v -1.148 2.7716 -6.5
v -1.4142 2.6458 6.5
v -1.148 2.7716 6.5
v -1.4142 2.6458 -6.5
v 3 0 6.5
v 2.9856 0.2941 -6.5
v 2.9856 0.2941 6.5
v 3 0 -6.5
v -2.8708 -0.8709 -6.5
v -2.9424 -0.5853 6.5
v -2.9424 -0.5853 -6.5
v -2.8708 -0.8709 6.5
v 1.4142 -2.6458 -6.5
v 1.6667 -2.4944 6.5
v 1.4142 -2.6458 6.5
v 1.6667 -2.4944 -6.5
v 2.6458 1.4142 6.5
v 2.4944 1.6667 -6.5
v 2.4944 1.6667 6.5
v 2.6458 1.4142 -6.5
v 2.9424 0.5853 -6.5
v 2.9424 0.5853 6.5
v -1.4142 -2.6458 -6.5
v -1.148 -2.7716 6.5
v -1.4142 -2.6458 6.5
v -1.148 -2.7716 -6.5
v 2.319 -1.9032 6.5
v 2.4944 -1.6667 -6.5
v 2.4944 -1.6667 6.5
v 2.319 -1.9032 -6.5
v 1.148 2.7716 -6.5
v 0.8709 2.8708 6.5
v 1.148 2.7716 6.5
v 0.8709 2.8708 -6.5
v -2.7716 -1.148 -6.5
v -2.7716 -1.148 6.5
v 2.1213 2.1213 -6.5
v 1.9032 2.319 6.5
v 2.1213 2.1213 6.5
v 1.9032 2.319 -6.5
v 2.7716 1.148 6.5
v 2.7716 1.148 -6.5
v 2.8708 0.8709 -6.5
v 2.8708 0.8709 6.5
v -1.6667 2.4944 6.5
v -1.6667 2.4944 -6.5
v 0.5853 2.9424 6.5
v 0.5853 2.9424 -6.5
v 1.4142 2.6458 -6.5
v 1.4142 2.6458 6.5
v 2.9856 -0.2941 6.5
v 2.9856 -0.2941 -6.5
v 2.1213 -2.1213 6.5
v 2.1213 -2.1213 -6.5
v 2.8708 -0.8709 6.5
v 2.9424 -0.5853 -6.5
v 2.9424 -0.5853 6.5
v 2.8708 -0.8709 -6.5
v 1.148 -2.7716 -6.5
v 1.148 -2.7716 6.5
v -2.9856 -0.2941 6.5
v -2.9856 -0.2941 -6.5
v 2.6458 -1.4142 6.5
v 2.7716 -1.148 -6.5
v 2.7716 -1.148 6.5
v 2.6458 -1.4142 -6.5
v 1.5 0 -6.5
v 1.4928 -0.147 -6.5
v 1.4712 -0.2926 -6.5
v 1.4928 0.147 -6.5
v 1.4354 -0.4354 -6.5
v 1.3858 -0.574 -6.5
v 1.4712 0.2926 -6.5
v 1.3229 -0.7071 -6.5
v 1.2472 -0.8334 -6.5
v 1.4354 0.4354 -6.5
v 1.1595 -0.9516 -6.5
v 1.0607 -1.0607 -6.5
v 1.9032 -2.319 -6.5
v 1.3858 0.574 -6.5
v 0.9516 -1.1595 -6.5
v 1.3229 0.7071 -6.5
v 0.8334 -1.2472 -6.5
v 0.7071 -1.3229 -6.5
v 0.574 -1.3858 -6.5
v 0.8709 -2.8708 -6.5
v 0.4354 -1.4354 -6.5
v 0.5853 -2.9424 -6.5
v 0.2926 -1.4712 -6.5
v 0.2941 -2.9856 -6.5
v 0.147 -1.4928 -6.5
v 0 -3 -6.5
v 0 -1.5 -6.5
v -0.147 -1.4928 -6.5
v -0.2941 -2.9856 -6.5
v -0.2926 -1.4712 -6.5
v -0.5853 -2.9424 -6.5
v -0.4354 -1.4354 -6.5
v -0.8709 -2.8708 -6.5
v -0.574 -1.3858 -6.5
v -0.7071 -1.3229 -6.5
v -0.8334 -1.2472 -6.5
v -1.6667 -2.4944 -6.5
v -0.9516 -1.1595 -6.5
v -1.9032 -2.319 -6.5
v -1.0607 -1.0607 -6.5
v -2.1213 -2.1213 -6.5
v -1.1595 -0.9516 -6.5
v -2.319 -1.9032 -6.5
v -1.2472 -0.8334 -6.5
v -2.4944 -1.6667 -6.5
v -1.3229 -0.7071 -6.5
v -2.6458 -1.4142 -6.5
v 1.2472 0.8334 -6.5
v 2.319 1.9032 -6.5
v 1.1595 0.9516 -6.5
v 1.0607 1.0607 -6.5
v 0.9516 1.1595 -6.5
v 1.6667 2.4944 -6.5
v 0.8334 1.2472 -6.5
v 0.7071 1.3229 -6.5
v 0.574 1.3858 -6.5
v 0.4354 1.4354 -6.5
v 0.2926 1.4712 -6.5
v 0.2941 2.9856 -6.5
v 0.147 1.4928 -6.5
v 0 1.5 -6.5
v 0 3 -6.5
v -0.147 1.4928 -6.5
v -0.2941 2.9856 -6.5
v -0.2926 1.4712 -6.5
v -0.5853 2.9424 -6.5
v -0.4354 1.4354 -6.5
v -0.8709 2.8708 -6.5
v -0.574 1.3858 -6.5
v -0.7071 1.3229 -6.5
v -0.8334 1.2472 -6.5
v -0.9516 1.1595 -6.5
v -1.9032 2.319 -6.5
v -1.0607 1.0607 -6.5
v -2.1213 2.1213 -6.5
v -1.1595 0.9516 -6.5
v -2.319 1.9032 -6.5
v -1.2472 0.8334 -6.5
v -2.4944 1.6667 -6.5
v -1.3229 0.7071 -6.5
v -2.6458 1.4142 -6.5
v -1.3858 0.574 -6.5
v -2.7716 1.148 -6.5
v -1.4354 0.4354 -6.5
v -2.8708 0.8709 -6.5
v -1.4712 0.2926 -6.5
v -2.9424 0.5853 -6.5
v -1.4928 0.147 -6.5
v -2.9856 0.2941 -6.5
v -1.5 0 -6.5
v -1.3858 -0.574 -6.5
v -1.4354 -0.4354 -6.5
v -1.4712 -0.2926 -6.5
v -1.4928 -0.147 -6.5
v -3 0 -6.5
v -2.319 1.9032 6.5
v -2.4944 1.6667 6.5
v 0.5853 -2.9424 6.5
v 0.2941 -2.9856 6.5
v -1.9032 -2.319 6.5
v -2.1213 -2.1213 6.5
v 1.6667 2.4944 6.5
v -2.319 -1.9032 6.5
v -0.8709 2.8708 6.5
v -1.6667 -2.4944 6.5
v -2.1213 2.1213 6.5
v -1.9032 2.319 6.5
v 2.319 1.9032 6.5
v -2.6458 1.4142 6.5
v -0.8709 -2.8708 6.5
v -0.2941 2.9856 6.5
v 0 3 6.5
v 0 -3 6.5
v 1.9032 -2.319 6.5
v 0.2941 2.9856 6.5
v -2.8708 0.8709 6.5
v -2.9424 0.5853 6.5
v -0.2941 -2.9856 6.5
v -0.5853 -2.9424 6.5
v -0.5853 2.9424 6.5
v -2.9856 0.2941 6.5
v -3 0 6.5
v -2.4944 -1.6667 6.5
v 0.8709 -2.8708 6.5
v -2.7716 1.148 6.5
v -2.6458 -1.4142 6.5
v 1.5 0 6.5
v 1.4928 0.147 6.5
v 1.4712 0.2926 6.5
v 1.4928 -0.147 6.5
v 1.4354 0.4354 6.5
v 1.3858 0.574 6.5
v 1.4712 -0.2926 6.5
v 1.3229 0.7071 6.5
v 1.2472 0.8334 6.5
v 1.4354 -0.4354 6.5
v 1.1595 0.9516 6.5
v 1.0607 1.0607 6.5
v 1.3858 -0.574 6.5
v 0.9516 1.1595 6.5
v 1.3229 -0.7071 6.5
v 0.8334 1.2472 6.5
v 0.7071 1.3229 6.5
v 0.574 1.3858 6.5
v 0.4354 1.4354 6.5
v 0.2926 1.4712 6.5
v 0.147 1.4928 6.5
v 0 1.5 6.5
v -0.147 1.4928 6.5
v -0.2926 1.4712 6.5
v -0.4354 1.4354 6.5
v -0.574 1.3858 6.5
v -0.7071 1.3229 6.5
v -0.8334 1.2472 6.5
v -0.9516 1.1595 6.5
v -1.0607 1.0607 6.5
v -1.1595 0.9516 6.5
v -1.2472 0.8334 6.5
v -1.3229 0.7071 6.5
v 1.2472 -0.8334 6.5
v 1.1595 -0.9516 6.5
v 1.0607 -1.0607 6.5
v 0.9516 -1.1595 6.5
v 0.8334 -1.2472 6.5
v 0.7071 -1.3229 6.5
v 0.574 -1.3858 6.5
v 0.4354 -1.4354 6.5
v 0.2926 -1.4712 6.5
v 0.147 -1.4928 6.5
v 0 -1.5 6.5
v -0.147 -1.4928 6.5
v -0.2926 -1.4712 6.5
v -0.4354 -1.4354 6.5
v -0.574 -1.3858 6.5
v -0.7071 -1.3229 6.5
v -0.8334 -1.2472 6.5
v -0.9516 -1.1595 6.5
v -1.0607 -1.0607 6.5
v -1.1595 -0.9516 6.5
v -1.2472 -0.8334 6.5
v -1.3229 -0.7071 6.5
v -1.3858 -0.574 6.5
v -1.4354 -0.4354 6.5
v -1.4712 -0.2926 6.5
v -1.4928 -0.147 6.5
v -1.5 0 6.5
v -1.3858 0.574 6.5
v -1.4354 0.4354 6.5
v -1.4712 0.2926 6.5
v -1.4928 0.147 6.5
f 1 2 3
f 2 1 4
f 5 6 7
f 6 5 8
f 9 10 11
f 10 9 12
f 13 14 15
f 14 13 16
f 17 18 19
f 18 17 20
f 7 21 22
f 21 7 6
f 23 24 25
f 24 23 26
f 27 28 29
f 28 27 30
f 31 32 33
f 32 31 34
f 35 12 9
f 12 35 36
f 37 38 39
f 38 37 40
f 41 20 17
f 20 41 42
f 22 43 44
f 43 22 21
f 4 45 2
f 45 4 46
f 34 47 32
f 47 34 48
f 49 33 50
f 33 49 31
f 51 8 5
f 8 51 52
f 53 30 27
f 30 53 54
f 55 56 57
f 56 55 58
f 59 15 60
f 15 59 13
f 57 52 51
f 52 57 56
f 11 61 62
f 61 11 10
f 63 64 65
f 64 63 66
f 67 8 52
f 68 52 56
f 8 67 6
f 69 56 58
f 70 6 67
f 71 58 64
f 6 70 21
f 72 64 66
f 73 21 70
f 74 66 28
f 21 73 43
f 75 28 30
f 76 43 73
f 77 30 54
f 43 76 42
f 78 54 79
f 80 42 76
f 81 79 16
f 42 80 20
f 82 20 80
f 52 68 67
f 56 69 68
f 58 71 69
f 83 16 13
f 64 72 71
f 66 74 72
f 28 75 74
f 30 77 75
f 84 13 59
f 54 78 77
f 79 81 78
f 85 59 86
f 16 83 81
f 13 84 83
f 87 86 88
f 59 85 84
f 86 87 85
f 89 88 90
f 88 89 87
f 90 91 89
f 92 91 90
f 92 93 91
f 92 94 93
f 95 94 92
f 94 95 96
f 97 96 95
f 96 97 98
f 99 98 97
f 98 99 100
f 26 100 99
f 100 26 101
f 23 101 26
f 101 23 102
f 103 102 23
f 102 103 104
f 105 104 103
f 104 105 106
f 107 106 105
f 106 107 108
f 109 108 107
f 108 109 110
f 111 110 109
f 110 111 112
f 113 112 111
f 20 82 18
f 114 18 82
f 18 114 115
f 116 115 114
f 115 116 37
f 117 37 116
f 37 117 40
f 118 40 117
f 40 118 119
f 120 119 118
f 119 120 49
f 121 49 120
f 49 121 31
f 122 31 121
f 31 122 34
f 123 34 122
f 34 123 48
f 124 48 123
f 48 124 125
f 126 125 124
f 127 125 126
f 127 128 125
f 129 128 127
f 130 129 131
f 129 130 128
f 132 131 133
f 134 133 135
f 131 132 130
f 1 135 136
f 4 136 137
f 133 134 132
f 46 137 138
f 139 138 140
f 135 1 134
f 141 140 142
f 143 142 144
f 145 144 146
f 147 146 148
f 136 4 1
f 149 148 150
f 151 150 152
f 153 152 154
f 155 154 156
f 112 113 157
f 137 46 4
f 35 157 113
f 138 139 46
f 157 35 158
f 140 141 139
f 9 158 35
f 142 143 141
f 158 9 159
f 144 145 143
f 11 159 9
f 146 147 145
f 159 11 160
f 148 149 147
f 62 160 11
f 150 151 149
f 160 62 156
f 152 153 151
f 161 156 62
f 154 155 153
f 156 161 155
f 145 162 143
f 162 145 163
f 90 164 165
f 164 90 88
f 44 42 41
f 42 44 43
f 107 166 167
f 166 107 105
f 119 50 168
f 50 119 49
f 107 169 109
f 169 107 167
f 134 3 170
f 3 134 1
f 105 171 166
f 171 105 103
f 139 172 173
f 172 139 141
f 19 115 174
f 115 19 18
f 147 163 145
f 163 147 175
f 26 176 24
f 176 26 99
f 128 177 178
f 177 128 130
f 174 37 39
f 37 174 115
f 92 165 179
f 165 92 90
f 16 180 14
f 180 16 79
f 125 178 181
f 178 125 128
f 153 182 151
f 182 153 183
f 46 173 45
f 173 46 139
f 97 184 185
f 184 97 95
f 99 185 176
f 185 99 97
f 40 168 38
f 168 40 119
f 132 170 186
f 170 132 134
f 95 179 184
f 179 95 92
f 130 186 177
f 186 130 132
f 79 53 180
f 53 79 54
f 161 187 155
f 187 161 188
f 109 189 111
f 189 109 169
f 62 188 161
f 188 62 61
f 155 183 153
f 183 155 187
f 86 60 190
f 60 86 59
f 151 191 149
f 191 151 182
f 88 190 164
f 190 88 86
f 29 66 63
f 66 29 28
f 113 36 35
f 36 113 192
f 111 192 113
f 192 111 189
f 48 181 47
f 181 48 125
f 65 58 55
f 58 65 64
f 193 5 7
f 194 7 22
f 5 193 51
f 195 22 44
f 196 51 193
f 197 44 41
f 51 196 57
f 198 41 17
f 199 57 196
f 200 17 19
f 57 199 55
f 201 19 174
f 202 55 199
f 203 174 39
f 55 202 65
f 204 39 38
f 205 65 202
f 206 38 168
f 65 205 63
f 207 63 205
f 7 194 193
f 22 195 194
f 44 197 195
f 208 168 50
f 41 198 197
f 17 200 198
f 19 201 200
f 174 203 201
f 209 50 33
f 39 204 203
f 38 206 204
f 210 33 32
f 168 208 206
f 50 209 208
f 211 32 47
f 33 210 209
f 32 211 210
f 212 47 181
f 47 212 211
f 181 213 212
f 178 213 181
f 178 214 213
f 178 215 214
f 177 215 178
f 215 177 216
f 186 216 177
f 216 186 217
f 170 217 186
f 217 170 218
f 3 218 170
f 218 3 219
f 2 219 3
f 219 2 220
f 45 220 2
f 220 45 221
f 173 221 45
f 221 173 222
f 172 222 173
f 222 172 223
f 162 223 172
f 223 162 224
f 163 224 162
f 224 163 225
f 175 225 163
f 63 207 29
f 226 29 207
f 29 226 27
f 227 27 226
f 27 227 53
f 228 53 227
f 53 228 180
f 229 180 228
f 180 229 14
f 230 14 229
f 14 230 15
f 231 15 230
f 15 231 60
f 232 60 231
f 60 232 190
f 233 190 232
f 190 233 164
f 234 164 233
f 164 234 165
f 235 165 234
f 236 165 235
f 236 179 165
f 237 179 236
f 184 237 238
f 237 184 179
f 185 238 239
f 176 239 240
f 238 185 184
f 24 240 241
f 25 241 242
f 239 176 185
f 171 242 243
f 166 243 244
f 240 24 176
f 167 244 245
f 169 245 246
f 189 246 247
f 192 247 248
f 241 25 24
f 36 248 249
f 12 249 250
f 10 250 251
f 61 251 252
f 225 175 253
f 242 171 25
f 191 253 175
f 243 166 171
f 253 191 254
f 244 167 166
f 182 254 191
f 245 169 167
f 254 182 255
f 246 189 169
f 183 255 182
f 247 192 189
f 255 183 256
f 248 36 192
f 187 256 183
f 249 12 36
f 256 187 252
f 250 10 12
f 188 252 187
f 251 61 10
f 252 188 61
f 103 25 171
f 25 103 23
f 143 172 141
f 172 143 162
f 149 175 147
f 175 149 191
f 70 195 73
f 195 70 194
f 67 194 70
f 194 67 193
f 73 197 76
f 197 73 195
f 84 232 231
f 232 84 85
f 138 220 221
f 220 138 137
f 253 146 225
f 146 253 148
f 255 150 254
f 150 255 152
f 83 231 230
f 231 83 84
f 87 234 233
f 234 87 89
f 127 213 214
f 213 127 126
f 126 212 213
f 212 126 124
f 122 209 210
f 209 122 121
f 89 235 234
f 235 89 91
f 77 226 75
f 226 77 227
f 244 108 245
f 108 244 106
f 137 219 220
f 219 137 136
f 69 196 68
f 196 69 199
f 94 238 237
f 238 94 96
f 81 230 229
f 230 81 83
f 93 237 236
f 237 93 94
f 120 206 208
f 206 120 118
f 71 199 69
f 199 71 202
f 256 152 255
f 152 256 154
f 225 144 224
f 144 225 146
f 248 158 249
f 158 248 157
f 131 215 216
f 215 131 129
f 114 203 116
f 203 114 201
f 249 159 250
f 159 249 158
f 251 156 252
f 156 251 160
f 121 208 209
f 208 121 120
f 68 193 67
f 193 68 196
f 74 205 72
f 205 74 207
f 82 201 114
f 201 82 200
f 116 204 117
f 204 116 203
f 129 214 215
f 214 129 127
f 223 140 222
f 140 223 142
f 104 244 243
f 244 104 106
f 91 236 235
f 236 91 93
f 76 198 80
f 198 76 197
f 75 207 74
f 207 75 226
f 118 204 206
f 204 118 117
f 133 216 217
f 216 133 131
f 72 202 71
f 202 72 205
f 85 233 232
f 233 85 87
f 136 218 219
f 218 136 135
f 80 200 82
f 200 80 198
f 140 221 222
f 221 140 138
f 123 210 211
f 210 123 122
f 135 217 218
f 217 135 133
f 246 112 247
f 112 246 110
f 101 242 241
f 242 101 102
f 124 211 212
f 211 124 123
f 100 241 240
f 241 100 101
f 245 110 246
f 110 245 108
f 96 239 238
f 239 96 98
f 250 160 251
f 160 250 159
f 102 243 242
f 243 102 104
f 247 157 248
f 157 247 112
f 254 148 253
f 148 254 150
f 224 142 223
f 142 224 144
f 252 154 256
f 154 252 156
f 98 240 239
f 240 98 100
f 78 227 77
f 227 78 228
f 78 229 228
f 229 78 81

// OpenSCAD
$fn=64;

thread_d = 3.0;
length = 13.0;
outer_d = 6.0;

module standoff_pillar(od, h, hole_d){
    difference(){
        cylinder(d=od, h=h, center=true);
        cylinder(d=hole_d, h=h+0.4, center=true);
    }
}

standoff_pillar(outer_d, length, thread_d);
